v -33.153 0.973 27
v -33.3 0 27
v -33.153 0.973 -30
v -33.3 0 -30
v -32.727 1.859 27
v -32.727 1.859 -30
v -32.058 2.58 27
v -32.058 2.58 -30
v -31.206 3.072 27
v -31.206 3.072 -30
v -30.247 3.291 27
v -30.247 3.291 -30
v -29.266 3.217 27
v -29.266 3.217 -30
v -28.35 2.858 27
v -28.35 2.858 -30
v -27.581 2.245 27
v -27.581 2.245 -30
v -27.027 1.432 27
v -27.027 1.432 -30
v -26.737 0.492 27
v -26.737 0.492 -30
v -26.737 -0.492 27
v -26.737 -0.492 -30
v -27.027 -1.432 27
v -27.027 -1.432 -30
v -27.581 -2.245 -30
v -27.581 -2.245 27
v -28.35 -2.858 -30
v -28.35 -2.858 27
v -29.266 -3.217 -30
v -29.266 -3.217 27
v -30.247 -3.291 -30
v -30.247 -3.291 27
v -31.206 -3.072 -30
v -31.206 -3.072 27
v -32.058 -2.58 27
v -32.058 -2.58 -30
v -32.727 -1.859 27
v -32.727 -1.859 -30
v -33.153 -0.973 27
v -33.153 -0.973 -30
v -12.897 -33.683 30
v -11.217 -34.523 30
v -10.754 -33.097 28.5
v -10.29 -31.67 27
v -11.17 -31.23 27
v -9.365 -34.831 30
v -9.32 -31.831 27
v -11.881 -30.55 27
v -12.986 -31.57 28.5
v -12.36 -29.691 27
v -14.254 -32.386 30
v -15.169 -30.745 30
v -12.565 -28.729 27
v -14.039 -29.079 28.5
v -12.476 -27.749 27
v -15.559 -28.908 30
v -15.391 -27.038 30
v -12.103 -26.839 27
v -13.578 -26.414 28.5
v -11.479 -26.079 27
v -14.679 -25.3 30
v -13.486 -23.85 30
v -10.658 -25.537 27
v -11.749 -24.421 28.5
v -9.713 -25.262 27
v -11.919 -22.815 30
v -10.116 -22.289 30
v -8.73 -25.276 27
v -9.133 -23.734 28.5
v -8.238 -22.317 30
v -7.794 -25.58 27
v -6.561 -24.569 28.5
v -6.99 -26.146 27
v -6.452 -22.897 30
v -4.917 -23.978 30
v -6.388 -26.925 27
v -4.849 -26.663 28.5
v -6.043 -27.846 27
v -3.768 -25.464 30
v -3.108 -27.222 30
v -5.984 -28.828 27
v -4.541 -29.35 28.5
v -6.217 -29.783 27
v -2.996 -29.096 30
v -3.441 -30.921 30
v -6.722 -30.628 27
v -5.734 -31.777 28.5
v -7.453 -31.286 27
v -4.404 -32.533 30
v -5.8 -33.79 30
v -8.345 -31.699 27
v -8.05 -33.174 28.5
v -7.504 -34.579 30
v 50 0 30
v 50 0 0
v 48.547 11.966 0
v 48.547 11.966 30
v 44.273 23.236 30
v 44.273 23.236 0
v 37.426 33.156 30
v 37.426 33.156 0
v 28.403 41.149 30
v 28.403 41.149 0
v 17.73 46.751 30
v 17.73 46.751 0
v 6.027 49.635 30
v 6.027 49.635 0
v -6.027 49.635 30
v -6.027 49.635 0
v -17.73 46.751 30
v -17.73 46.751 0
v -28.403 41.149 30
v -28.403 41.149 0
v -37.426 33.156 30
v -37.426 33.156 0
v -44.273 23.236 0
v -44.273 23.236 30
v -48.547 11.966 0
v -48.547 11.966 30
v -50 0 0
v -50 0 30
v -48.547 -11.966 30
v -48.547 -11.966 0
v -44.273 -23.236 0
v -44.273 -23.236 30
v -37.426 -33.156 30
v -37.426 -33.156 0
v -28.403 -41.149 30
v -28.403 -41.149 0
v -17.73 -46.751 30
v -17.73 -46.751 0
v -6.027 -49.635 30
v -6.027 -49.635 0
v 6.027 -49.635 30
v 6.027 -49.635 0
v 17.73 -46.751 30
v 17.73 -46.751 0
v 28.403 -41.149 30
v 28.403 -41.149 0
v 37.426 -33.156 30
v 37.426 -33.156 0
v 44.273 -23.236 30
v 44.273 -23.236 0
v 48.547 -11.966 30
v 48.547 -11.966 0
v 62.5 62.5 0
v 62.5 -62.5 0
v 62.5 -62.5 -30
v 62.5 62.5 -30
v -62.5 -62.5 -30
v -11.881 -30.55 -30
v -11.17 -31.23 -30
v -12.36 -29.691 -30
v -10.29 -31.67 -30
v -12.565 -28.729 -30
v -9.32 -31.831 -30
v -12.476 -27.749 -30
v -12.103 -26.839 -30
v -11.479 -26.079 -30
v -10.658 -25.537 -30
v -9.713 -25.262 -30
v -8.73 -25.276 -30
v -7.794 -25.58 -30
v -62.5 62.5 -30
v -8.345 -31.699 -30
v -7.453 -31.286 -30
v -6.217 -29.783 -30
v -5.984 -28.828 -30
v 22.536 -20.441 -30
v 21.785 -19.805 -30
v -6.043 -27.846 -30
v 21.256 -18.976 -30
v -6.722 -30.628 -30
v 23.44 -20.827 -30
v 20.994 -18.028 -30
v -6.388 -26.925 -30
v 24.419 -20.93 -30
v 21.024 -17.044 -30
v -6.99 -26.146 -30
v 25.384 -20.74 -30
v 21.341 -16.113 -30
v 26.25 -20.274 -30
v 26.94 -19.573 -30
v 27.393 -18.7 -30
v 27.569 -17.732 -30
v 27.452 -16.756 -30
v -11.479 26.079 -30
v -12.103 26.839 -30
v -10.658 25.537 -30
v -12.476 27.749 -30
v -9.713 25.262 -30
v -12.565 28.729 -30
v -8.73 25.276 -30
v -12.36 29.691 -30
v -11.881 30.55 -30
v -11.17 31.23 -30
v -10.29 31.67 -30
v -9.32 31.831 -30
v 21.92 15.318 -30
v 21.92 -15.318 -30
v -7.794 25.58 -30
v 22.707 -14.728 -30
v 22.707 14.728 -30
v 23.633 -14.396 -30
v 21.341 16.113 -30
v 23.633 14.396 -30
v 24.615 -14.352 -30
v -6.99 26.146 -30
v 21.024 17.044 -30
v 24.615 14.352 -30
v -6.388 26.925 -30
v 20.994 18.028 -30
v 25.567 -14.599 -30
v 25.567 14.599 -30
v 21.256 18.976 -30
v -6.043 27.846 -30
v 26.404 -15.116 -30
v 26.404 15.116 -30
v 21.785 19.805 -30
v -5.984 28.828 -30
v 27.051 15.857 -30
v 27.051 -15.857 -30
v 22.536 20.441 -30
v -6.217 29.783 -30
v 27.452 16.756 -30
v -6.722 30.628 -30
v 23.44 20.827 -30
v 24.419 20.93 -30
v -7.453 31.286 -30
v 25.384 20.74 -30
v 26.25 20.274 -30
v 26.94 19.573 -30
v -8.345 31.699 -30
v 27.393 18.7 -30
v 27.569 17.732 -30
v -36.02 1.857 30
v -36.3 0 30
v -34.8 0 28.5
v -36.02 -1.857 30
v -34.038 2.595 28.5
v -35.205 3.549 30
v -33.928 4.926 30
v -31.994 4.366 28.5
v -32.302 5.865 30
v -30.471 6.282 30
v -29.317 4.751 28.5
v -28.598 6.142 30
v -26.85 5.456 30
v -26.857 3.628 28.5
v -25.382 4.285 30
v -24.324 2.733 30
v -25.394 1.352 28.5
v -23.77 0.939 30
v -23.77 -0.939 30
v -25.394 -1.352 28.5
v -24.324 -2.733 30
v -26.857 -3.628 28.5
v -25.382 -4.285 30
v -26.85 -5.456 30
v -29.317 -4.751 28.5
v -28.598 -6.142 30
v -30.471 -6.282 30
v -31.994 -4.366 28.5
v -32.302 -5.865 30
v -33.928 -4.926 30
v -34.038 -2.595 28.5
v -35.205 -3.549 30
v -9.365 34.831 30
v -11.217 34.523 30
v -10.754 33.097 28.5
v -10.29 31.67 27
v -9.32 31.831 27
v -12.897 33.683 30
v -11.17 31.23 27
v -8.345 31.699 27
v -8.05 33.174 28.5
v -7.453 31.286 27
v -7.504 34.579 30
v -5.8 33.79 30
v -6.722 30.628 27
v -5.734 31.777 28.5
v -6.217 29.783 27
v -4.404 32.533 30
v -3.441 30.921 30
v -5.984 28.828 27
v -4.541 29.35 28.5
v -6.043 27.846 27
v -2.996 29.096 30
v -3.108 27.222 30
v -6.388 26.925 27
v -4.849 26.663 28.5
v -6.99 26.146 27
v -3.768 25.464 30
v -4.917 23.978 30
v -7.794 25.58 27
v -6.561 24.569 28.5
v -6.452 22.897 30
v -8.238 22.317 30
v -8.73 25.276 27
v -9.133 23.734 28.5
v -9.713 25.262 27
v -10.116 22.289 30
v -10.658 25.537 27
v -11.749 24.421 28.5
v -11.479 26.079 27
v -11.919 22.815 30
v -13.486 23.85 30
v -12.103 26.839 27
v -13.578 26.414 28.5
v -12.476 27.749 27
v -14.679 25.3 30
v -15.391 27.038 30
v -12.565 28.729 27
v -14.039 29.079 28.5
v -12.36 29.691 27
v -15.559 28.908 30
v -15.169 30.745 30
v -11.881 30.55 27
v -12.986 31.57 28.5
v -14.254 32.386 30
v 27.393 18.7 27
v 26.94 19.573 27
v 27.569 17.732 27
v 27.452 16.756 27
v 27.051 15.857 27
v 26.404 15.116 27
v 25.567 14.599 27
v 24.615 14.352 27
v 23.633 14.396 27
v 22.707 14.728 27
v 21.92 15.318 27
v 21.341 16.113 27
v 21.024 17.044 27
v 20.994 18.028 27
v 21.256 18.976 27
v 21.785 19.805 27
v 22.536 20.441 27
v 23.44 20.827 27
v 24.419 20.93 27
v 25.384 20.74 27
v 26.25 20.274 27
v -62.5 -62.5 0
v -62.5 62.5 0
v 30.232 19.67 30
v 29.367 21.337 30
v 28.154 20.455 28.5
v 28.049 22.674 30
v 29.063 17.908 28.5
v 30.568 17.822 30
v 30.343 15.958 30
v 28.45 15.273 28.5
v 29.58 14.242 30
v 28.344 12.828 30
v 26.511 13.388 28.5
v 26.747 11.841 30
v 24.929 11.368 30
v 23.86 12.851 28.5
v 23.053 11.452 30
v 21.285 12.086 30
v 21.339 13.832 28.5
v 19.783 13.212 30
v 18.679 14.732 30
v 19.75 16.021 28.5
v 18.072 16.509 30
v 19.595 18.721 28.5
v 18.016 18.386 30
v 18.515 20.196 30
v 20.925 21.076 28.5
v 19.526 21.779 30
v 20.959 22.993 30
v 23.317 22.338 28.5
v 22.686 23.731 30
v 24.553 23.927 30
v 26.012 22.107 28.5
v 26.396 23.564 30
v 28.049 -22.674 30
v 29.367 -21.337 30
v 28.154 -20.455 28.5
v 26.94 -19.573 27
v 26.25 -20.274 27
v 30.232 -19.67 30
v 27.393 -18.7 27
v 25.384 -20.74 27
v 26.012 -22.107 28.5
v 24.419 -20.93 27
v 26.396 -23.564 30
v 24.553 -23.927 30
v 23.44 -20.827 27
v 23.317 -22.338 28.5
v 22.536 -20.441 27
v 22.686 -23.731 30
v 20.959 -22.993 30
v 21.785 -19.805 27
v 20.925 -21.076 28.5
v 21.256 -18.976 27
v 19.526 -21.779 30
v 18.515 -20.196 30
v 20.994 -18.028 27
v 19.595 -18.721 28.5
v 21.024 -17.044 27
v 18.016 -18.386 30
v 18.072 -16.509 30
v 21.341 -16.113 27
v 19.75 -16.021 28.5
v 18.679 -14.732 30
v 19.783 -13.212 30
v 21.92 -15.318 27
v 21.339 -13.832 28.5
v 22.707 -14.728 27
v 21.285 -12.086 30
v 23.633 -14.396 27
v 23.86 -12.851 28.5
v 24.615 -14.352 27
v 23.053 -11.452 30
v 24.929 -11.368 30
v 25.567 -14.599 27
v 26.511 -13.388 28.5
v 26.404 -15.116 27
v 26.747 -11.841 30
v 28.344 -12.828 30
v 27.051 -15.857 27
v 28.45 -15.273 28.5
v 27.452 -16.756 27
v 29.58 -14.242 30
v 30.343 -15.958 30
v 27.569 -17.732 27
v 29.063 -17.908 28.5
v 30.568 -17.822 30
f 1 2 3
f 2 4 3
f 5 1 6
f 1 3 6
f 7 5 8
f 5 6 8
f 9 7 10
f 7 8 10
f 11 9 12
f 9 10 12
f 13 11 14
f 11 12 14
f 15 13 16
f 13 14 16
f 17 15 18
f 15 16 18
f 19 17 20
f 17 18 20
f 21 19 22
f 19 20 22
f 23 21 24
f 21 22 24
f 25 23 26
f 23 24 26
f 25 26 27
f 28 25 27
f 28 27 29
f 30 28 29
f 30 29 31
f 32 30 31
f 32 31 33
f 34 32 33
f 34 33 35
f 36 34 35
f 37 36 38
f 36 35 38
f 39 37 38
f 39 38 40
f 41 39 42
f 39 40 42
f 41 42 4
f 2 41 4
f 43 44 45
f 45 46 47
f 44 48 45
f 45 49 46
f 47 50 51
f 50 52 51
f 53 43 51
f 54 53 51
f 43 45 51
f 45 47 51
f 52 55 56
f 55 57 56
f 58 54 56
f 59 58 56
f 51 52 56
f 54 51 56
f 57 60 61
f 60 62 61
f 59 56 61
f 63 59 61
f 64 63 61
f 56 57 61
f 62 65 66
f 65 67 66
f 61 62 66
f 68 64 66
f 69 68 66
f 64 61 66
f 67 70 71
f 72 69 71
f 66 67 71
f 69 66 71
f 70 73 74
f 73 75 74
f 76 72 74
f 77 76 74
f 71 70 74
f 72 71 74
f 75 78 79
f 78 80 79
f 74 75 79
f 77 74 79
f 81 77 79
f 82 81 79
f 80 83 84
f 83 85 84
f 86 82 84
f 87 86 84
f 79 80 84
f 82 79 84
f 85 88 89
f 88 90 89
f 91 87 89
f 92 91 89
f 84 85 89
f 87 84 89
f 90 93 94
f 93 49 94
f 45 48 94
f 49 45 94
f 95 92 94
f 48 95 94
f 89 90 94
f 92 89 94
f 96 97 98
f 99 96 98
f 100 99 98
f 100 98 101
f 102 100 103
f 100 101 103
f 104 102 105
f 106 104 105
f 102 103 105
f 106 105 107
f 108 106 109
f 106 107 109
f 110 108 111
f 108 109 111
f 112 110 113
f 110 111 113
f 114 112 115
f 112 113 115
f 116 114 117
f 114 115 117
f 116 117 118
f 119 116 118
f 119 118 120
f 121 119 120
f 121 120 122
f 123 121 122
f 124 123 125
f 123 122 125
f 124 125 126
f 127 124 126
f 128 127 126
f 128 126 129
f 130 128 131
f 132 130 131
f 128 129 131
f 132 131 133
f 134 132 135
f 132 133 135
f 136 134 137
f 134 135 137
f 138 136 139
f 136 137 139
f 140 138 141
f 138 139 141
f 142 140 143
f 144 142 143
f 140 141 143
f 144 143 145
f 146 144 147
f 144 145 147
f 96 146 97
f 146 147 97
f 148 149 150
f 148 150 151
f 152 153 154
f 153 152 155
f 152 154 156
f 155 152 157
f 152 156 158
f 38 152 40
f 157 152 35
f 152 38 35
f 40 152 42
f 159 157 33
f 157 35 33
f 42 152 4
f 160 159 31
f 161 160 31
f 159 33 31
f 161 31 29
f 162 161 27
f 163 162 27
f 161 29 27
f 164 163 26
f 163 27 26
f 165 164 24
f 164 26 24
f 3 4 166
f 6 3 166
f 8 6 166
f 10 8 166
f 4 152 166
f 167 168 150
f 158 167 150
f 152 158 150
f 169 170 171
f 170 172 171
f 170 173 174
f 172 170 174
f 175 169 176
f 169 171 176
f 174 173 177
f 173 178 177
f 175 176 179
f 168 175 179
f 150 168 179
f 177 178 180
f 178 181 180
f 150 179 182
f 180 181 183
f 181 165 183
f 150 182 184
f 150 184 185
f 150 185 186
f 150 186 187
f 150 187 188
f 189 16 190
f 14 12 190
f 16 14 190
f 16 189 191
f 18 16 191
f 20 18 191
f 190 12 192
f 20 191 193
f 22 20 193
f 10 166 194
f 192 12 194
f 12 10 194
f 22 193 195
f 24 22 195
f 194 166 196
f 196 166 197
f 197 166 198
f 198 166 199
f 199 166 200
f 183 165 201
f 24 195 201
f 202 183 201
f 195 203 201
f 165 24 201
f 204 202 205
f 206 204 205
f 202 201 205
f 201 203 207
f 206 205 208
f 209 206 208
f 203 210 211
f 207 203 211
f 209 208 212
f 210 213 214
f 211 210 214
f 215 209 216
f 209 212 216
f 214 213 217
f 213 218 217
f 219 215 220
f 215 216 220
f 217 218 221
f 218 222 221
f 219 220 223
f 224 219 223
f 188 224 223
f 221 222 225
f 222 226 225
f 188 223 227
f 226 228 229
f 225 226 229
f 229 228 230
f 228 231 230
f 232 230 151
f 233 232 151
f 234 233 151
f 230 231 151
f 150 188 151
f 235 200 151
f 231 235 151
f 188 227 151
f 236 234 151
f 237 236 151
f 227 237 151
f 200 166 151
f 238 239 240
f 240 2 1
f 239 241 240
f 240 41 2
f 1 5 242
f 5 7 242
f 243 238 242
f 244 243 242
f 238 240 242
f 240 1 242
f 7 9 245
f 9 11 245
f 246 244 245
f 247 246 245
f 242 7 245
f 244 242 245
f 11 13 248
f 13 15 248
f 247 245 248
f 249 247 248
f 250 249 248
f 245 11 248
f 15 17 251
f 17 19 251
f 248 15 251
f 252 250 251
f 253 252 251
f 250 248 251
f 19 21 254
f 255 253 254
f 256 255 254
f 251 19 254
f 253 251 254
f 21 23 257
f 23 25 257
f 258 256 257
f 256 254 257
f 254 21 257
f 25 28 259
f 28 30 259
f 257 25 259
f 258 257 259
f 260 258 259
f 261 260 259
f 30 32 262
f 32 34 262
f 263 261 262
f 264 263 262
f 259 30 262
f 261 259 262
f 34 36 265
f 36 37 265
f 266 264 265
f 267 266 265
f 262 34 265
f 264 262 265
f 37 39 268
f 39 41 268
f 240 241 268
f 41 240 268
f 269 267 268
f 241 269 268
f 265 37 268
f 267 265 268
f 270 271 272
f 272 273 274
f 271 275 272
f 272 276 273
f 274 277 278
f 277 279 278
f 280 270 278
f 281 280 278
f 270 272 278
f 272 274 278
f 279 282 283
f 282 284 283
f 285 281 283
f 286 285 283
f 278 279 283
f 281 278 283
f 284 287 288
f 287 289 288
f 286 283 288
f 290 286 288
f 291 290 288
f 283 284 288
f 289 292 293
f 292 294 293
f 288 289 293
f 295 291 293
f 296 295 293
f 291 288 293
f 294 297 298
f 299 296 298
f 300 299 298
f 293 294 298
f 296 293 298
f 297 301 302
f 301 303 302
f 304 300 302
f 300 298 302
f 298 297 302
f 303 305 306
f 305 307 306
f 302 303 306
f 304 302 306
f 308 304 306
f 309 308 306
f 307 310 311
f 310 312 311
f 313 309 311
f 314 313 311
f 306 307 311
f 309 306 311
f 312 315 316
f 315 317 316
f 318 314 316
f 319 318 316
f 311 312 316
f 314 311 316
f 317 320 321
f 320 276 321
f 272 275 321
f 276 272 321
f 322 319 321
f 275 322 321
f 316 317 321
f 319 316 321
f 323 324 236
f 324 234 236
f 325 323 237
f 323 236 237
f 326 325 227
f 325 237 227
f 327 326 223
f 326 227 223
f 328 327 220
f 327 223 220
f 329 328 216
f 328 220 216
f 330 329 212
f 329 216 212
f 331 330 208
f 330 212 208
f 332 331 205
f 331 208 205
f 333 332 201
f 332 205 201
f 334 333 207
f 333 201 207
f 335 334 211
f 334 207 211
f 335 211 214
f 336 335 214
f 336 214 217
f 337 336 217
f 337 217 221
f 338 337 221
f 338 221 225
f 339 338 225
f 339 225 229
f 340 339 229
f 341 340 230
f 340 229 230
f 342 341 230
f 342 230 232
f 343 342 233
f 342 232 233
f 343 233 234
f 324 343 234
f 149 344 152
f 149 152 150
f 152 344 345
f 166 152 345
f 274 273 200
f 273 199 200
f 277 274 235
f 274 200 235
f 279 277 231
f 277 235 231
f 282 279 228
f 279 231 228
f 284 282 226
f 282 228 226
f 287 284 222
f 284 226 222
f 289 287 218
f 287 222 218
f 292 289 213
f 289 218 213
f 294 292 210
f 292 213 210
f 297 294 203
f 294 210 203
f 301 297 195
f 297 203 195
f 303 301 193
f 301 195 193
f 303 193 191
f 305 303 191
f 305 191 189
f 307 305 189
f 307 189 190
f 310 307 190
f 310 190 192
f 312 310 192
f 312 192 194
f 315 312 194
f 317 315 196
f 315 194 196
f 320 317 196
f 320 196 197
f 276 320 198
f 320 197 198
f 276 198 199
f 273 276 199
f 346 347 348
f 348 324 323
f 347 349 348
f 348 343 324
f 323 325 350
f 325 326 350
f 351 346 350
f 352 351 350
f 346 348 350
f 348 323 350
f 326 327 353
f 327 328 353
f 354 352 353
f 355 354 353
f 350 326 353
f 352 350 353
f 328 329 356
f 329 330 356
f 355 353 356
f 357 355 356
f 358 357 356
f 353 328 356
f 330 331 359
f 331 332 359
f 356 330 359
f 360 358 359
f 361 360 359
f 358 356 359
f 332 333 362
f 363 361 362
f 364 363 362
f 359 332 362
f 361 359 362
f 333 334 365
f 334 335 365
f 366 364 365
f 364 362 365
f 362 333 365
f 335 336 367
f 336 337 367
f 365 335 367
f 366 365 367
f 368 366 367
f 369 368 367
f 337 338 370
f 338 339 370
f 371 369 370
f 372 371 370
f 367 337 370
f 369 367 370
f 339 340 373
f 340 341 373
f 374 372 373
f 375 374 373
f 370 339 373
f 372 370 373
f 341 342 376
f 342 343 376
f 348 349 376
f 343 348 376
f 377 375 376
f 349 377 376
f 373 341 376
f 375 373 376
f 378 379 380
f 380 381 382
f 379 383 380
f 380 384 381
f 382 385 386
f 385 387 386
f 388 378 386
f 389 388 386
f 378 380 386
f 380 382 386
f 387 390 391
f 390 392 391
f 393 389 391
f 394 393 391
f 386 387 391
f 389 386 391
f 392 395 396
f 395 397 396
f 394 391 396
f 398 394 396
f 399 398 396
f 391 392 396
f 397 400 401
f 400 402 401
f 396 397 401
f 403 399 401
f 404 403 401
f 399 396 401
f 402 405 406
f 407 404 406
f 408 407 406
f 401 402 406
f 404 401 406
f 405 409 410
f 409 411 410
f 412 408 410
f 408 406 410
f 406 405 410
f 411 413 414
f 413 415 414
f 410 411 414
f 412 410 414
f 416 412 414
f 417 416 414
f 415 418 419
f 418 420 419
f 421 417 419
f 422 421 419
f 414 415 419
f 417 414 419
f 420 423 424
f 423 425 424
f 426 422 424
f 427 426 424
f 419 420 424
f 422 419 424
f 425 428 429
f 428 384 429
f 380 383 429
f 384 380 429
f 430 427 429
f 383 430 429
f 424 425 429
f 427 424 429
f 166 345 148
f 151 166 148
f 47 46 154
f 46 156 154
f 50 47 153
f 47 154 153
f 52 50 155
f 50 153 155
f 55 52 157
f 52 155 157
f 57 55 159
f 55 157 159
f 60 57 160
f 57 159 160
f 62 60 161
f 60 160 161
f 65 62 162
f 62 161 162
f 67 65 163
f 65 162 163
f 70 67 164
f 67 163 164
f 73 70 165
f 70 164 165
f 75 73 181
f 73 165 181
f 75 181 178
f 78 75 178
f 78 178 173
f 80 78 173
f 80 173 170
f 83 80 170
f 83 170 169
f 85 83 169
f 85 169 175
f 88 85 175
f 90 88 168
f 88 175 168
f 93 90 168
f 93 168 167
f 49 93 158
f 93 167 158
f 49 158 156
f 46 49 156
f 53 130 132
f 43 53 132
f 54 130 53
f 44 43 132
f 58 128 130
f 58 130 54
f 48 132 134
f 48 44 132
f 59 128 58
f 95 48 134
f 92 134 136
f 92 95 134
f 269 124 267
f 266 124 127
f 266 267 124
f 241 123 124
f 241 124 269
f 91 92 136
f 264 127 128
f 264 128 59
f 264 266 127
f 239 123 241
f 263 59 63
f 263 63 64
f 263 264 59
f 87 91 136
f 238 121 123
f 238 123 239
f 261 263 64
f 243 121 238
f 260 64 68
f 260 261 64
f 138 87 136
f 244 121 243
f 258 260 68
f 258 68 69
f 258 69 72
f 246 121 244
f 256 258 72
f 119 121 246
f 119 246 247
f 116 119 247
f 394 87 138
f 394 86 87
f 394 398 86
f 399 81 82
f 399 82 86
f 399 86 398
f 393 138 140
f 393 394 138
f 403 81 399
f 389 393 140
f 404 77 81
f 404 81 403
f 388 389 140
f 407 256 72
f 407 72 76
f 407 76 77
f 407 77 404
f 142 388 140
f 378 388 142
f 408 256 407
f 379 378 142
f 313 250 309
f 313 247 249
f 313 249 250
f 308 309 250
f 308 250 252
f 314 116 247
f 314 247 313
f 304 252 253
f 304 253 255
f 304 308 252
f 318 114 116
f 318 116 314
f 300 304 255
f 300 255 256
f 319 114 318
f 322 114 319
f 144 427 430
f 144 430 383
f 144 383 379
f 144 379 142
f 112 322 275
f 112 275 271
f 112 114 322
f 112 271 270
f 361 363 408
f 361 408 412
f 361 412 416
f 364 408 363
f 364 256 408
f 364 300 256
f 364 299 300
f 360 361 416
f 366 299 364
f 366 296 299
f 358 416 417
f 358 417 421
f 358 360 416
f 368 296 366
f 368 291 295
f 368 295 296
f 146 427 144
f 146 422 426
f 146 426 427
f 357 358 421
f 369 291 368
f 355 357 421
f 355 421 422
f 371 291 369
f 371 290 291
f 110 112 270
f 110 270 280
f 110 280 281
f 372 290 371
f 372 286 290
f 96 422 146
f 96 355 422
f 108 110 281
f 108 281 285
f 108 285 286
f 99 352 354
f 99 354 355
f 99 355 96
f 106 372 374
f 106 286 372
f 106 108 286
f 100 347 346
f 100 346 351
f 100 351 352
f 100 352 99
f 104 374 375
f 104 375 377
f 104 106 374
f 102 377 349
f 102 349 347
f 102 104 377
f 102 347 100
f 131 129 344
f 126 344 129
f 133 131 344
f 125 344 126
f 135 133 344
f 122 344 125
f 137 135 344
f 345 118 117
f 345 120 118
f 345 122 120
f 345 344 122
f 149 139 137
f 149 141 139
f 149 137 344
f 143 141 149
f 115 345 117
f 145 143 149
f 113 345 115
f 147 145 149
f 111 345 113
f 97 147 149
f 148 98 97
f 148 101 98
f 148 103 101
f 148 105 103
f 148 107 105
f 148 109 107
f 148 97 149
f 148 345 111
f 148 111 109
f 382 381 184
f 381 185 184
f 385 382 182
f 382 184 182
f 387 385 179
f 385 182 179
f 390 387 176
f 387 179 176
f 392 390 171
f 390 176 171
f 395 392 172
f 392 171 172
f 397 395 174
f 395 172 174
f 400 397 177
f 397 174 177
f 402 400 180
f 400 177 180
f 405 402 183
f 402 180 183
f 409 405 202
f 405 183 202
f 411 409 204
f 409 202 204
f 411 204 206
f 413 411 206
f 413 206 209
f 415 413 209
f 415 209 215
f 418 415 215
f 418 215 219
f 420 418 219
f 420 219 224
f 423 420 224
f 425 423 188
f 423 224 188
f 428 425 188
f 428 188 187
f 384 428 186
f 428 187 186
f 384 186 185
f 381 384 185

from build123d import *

# Parameters (mm, degrees)
SKETCH1_W                                       = 125
SKETCH1_H                                       = 125
BOSS_EXTRUDE1_DEPTH                             = 30
SKETCH1_3_R                                     = 50
BOSS_EXTRUDE2_DEPTH                             = 30
CSK_FOR_M6_FLAT_HEAD_MACHINE_SCREW1_D           = 6.6
CSK_FOR_M6_FLAT_HEAD_MACHINE_SCREW1_CSINK_D     = 12.6
CSK_FOR_M6_FLAT_HEAD_MACHINE_SCREW1_CSINK_ANGLE = 90
CIRPATTERN1_COUNT                               = 5


with BuildPart() as part:
    # Sketch1 → Boss-Extrude1 (new body)
    with BuildSketch(Plane.XY):
        Rectangle(SKETCH1_W, SKETCH1_H)
    extrude(amount=-BOSS_EXTRUDE1_DEPTH)

    # Sketch1_3 → Boss-Extrude2 (add)
    with BuildSketch(Plane.XY):
        Circle(SKETCH1_3_R)
    extrude(amount=BOSS_EXTRUDE2_DEPTH)

    # CSK for M6 Flat Head Machine Screw1 (through all)
    with Locations(Plane.XY.offset(30)):
        with Locations((-30, 0)):
            csk_for_m6_flat_head_machine_screw1 = CounterSinkHole(CSK_FOR_M6_FLAT_HEAD_MACHINE_SCREW1_D / 2, CSK_FOR_M6_FLAT_HEAD_MACHINE_SCREW1_CSINK_D / 2, counter_sink_angle=CSK_FOR_M6_FLAT_HEAD_MACHINE_SCREW1_CSINK_ANGLE)

    # CirPattern1: CSK for M6 Flat Head Machine Screw1 ×5 about axis
    cirpattern1_axis = Axis((0, 0, 0), (0, 0, 1))
    for i in range(1, CIRPATTERN1_COUNT):
        add(csk_for_m6_flat_head_machine_screw1.rotate(cirpattern1_axis, i * 360 / CIRPATTERN1_COUNT), mode=Mode.SUBTRACT)


solid = part.part
